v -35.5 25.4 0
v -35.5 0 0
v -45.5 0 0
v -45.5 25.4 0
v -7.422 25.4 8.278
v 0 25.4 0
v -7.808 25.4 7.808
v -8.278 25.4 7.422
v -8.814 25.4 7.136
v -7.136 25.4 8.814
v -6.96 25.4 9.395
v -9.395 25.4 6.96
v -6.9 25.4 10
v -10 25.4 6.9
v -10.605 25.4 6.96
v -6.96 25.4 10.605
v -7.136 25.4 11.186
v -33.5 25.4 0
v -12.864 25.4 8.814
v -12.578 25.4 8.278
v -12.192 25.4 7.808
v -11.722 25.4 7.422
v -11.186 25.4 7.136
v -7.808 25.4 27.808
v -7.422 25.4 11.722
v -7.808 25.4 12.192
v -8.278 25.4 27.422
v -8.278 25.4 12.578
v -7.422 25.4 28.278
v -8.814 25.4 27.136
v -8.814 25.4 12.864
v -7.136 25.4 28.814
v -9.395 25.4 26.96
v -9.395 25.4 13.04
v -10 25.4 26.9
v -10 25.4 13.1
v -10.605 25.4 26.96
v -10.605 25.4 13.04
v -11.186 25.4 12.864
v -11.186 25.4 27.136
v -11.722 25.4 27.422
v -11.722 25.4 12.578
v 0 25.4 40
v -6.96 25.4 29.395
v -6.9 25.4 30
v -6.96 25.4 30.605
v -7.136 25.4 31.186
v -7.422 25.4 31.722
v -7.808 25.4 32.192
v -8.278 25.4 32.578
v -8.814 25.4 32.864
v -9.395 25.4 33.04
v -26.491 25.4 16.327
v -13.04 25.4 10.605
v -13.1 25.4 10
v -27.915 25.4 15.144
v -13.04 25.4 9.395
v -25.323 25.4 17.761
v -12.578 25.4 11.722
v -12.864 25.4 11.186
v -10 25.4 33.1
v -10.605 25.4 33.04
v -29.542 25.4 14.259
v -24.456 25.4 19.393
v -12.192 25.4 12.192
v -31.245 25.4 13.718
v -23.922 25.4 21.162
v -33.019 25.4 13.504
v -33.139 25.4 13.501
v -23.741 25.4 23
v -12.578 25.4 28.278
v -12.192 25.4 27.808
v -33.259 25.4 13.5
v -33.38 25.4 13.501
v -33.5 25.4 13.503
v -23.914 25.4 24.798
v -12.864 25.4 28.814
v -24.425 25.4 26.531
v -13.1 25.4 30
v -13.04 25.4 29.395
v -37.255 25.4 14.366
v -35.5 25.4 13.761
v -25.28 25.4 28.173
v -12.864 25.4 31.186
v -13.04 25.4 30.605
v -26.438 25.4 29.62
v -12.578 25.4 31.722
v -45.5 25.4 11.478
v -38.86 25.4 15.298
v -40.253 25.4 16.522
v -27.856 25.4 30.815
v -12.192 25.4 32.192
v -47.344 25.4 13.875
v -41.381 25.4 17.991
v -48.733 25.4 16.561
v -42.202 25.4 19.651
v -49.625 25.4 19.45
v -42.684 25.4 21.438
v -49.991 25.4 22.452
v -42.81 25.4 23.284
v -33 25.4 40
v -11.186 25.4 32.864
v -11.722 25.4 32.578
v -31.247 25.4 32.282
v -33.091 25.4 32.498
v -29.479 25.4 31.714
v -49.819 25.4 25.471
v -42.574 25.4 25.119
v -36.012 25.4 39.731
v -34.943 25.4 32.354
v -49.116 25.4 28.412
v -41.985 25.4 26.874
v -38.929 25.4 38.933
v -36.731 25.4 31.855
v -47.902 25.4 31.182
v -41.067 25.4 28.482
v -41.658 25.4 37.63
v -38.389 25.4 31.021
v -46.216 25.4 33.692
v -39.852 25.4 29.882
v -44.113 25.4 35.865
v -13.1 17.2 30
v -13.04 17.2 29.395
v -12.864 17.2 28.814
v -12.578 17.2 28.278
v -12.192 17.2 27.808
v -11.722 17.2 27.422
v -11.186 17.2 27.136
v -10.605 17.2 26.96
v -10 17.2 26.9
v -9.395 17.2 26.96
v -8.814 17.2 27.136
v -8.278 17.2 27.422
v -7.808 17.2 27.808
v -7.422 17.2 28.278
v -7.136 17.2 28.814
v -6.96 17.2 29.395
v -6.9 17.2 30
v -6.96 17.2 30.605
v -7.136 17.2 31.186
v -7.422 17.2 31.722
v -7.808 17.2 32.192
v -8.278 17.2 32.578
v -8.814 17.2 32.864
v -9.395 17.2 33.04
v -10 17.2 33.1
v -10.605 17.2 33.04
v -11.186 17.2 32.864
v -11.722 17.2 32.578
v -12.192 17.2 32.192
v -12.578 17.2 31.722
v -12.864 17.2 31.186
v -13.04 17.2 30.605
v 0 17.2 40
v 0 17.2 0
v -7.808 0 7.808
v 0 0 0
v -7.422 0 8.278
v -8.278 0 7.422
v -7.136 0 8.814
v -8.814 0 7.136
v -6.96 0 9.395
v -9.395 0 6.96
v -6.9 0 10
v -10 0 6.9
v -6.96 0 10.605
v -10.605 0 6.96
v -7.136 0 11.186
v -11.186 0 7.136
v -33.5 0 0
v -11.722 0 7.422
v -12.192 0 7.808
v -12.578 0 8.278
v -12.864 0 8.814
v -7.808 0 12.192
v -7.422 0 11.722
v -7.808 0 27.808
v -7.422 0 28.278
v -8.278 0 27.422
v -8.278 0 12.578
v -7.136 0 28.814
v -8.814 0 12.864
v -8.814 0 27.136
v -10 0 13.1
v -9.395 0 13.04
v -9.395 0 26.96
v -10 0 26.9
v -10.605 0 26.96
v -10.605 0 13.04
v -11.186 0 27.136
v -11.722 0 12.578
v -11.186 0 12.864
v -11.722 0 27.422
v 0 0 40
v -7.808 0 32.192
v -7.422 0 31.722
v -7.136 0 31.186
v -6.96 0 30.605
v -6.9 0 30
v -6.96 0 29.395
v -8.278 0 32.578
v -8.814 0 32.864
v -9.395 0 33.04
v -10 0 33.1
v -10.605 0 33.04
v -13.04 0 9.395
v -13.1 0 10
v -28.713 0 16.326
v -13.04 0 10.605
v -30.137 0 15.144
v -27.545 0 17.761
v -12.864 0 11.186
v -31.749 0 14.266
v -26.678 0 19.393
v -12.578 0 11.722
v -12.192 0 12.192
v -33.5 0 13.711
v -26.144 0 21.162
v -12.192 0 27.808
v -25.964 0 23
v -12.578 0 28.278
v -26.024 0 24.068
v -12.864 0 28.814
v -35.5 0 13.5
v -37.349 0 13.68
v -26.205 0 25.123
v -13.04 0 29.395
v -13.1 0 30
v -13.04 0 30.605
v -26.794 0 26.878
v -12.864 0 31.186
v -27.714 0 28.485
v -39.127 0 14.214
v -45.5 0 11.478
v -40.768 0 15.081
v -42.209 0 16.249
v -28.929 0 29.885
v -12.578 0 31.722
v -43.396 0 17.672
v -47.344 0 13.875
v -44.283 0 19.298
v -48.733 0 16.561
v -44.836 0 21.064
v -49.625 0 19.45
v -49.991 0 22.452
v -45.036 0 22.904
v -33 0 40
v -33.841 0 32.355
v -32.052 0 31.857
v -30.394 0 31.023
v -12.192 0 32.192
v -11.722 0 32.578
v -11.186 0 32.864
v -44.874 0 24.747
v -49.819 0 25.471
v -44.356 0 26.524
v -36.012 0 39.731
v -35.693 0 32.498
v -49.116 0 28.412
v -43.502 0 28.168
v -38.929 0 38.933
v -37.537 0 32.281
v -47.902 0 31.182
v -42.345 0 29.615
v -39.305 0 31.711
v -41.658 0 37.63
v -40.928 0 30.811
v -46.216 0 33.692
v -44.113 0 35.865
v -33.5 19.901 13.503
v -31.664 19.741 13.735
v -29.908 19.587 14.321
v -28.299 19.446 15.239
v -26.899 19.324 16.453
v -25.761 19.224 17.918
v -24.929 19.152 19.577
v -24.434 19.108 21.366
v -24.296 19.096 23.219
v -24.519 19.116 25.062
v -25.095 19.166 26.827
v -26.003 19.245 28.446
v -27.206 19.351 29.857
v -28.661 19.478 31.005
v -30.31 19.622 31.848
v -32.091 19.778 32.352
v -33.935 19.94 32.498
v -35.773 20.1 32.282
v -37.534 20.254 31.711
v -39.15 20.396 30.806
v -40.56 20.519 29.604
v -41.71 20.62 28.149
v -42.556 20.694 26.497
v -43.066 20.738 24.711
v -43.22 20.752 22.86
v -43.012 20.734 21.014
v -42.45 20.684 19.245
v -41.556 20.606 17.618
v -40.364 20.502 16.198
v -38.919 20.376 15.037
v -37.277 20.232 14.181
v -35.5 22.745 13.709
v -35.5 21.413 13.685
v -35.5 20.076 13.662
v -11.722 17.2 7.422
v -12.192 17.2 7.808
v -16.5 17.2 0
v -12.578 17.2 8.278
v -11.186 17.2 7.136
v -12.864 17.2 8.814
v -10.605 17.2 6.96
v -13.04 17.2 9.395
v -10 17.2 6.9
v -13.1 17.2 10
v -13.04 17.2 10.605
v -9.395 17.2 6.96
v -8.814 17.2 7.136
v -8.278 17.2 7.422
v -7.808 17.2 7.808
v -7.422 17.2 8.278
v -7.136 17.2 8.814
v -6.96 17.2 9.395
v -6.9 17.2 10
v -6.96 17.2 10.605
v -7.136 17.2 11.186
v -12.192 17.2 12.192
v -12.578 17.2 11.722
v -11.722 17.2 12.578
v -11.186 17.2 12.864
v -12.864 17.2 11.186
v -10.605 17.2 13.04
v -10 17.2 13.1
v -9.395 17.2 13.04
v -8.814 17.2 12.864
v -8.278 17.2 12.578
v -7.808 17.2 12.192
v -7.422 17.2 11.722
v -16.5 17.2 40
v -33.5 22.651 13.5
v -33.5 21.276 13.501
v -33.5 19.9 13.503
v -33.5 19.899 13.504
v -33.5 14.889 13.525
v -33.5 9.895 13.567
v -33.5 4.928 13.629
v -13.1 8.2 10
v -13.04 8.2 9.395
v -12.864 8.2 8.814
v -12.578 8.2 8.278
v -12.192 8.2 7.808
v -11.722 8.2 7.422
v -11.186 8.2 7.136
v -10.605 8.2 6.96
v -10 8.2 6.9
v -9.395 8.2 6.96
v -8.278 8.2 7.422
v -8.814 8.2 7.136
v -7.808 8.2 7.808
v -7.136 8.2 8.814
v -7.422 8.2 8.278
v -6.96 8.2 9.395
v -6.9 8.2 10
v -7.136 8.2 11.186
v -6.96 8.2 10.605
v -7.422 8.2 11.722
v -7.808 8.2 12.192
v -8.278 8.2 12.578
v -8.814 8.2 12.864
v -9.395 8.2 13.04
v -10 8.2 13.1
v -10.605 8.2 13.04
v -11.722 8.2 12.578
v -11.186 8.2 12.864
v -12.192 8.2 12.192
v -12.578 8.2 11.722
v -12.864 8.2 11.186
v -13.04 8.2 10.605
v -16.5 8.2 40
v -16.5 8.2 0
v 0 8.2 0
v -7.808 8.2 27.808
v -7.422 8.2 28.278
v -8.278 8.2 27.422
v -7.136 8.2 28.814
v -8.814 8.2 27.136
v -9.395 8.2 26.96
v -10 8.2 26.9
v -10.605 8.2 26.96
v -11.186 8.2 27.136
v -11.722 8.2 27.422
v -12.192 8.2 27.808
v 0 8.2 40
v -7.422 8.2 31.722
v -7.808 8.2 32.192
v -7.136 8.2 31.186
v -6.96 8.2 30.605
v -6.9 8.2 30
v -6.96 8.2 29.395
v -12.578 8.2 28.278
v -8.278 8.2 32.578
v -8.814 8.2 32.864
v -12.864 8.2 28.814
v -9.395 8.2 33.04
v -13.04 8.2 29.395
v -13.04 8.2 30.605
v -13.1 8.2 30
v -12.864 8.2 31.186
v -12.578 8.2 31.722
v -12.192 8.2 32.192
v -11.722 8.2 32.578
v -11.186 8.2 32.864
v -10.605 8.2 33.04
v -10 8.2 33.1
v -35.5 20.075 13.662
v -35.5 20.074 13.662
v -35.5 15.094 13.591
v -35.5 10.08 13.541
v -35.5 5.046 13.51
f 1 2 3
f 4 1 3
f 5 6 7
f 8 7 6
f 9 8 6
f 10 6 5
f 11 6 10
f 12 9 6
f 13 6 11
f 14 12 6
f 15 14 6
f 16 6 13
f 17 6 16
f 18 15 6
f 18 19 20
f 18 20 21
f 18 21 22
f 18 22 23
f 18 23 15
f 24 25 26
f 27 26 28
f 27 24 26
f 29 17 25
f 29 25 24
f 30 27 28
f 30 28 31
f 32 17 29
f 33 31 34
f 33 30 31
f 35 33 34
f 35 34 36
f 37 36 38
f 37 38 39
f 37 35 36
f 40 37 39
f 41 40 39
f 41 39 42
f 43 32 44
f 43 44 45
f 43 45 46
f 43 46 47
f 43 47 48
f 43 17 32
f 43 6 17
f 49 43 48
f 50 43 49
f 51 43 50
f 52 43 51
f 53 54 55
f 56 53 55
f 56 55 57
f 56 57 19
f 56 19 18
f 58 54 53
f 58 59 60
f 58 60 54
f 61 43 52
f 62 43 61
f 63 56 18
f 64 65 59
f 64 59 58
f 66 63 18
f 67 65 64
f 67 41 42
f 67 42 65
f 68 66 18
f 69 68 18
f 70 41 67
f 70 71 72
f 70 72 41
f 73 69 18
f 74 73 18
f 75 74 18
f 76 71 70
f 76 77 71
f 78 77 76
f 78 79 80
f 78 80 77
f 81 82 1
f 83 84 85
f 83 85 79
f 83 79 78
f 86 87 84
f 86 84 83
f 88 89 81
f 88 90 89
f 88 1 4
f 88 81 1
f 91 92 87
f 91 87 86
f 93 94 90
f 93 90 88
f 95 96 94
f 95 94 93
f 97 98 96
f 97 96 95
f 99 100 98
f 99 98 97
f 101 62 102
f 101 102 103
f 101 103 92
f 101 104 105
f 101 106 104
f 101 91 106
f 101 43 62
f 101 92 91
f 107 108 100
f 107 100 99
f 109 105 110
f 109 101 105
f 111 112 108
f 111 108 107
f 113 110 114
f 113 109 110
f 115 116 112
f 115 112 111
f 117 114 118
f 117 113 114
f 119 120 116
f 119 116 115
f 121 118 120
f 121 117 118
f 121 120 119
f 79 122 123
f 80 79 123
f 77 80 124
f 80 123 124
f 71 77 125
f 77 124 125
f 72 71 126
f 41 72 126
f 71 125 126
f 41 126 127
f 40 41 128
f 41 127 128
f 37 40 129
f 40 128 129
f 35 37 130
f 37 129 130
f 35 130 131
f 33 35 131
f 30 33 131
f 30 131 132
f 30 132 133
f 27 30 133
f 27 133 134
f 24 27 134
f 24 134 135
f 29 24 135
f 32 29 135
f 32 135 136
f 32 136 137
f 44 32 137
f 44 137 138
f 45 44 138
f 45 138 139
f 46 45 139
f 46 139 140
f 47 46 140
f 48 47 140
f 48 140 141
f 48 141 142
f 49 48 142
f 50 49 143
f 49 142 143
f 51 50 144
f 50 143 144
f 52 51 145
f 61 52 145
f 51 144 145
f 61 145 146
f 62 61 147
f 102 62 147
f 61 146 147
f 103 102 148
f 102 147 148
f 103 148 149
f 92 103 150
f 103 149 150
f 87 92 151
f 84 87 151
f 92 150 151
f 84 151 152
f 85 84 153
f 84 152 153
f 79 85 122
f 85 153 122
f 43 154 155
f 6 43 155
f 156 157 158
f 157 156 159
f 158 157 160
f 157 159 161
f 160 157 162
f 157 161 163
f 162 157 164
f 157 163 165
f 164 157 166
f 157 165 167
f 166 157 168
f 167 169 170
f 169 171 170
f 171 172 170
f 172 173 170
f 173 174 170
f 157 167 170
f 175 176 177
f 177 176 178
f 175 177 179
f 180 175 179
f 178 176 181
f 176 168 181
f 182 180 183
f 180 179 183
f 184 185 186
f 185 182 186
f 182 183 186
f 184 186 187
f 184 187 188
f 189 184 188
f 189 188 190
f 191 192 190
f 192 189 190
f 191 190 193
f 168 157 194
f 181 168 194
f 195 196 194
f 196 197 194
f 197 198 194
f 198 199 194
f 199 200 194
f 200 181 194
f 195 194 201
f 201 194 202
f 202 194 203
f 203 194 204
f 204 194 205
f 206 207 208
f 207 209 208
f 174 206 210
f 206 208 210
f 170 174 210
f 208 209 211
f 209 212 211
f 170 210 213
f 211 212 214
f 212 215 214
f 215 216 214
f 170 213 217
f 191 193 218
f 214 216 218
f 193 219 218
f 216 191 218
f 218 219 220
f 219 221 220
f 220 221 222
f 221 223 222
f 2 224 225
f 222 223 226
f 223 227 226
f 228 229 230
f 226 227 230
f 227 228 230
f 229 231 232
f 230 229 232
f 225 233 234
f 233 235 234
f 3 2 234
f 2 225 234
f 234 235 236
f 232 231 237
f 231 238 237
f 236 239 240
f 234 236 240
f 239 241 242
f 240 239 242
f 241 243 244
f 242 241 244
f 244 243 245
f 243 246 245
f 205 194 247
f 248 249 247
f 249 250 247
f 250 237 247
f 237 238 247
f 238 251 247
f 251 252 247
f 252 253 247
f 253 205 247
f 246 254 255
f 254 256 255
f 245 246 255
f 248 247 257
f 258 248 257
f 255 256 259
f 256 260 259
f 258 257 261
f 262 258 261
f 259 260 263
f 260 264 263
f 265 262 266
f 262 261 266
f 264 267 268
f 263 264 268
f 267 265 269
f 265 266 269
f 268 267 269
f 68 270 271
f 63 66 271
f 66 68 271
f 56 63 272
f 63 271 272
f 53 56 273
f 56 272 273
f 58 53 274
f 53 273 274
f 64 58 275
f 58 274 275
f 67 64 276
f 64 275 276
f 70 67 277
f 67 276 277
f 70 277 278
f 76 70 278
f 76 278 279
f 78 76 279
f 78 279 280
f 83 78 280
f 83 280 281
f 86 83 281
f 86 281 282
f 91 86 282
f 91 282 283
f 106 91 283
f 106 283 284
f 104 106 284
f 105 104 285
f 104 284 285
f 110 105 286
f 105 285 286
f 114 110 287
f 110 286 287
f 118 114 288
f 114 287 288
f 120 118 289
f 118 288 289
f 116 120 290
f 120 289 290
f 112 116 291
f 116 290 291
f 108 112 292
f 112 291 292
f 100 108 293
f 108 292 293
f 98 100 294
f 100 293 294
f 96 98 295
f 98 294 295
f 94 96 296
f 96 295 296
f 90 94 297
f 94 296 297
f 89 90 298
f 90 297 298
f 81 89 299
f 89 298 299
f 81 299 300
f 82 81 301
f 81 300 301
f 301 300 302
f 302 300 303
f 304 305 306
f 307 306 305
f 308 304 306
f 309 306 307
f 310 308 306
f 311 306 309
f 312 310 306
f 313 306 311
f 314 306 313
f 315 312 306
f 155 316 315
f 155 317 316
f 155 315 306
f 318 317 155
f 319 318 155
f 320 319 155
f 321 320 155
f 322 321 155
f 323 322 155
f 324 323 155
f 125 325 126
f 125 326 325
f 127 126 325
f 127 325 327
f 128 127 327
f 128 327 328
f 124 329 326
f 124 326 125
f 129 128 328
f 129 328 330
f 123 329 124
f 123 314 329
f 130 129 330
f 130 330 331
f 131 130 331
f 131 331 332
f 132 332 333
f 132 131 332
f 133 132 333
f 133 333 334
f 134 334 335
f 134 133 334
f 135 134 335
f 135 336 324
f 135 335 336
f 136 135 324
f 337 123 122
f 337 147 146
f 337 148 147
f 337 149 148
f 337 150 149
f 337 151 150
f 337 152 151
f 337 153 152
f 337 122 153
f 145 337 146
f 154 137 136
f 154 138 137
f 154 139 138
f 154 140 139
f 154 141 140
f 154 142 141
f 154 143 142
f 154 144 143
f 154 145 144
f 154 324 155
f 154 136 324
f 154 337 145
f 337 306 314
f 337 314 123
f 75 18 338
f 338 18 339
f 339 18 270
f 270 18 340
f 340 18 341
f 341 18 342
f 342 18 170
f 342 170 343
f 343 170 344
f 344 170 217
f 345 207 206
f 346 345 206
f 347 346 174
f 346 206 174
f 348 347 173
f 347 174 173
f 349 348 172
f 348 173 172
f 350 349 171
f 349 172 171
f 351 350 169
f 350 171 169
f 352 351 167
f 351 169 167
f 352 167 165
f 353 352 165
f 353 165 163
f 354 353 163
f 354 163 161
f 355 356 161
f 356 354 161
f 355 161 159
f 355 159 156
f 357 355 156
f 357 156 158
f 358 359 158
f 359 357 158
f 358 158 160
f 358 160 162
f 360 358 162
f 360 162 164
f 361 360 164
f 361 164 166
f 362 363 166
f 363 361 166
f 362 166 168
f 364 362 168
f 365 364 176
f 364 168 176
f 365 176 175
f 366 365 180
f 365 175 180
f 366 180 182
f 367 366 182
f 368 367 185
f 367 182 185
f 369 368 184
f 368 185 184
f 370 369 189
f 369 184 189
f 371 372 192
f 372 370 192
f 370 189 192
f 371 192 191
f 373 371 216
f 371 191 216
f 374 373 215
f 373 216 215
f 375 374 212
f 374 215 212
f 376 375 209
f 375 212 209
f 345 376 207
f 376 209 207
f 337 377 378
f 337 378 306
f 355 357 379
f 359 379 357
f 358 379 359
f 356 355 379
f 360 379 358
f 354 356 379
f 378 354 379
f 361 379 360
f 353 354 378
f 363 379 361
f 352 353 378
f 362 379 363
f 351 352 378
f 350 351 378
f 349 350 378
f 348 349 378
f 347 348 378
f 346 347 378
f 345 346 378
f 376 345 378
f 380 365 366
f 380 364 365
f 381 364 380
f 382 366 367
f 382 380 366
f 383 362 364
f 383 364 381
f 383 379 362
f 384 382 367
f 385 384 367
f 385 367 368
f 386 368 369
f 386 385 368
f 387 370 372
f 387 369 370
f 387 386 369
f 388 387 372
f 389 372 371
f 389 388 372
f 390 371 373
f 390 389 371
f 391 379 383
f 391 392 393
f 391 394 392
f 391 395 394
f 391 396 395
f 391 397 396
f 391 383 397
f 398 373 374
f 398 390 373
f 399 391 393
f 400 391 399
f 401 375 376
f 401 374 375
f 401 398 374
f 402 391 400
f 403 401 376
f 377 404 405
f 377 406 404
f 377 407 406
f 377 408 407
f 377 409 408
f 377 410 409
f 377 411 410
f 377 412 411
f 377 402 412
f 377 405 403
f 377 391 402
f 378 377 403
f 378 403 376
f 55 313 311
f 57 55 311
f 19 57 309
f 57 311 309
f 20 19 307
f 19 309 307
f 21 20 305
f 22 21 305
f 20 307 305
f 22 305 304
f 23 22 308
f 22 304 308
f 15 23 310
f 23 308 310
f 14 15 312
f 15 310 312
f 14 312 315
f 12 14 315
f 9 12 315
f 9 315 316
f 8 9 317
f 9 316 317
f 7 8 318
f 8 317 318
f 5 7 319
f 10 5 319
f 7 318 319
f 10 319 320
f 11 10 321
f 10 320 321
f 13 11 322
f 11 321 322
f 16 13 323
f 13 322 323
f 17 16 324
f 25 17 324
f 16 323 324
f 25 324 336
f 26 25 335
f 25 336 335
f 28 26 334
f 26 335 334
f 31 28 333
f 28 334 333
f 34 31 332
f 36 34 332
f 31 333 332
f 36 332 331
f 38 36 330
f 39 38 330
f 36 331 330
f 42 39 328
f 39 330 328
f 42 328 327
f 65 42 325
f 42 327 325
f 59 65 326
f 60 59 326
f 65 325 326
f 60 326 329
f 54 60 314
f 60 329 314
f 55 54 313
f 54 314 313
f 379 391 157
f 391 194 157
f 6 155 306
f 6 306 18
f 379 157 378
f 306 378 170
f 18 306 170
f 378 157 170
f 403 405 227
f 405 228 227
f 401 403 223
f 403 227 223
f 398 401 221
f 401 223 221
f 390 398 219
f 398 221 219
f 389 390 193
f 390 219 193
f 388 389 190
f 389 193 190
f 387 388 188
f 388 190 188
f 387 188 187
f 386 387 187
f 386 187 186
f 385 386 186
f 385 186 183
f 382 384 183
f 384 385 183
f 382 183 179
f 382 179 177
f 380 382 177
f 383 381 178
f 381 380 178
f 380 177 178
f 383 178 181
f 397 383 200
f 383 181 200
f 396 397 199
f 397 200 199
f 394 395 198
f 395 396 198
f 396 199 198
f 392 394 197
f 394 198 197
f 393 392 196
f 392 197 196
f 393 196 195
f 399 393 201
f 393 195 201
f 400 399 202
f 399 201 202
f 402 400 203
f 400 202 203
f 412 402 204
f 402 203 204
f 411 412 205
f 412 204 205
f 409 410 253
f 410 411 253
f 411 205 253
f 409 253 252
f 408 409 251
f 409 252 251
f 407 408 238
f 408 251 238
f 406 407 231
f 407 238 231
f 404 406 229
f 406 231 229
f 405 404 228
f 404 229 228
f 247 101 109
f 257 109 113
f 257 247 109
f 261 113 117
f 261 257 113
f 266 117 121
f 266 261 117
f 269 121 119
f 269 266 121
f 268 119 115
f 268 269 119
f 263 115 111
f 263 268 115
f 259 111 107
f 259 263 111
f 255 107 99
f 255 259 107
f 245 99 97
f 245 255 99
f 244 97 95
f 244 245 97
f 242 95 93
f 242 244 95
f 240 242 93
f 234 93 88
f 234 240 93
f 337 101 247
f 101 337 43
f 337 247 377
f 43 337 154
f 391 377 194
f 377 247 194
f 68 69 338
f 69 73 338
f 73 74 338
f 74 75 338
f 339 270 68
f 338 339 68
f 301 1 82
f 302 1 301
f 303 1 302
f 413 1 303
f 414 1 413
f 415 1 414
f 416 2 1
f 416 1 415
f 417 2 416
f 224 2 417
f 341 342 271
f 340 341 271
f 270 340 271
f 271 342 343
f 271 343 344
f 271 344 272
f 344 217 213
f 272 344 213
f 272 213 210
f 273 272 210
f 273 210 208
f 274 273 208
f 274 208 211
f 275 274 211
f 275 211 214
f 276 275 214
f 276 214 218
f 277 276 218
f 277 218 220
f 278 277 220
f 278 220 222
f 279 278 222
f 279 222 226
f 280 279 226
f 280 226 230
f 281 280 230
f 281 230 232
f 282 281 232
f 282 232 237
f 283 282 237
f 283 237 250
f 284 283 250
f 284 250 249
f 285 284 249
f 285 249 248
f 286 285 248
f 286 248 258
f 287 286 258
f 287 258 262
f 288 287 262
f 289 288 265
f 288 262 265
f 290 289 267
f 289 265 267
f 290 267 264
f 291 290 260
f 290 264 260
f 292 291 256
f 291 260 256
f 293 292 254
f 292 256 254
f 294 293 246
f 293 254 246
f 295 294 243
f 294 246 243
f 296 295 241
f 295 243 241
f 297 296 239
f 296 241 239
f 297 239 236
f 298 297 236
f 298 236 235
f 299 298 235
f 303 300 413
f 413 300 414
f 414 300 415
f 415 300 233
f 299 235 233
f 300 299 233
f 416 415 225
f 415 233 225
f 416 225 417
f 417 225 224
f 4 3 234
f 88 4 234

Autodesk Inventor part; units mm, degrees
ref_plane "YZ Plane" through (0, 0, 0) normal (1, 0, 0) x (0, 1, 0)
ref_plane "XZ Plane" through (0, 0, 0) normal (0, 1, 0) x (-1, 0, 0)
ref_plane "XY Plane" through (0, 0, 0) normal (0, 0, 1) x (1, 0, 0)
sketch "Sketch1" plane through (0, 0, 0) normal (0, 1, 0) x (-1, 0, 0)
  line L0 (50, 0) -> (50, 40)
  line L1 (50, 40) -> (0, 40)
  line L2 (0, 40) -> (0, 0)
  line L3 (0, 0) -> (10, 0)
  line L4 (10, 0) -> (10, 10)
  line L5 (10, 10) -> (10, 30)
  circle A0 centre (10, 30) radius 3.1
  circle A1 centre (10, 10) radius 3.1
  line L6 (45.5, 0) -> (45.5, 11.4783)
  line L7 (0, 0) -> (33.5, 0)
  line L8 (35.5, 0) -> (35.5, 18.6699)
  line L9 (50, 40) -> (45.5, 40)
  line L10 (45.5, 40) -> (45.5, 35.5)
  line L11 (45.5, 35.5) -> (45.5, 34.5217)
  line L12 (45.5, 23) -> (33, 23)
  arc A2 (45.5, 11.4783) -> (33, 40) centre (33, 23) ccw
  line L13 (0, 0) -> (33.5, 0)
  line L14 (35.5, 0) -> (45.5, 0)
  line L15 (33.5, 0) -> (33.5, 18.0251)
  line L16 (0, 0) -> (33.5, 0)
  line L17 (35.5, 0) -> (45.5, 0)
  line L18 (33, 23) -> (28, 23)
  line L19 (33, 23) -> (38, 23)
  arc A3 (35.5, 18.6699) -> (38, 23) centre (33, 23) ccw
  arc A4 (28, 23) -> (33.5, 18.0251) centre (33, 23) ccw
  dimension "d0" = 50
  dimension "d1" = 40
  dimension "d2" = 10
  dimension "d3" = 10
  dimension "d4" = 20
  dimension "d5" = 6.2
  dimension "d6" = 6.2
  dimension "d7" = 45.5
  dimension "d8" = 35.5
  dimension "d9" = 4.5
  dimension "d10" = 4.5
  dimension "d13" = 12.5
  dimension "d14" = 12.5
  dimension "d15" = 2
extrude "Extrusion1" add sketch "Sketch1" along normal blind 25.4 contours A2 L6 L14 L8 A3 L12 L18 A4 L15 L7 L3 L2 L1
sketch "Sketch2" plane through (-33, 0, 40) normal (0, 0, 1) x (1, 0, 0)
  line L0 (33, 0) -> (33, 8.2)
  line L1 (33, 0) -> (33, 25.4) projected
  line L2 (33, 8.2) -> (16.5, 8.2)
  line L3 (16.5, 8.2) -> (16.5, 17.2)
  line L4 (16.5, 17.2) -> (33, 17.2)
  line L5 (33, 17.2) -> (33, 8.2)
  dimension "d18" = 8.2
  dimension "d19" = 16.5
  dimension "d20" = 9
extrude "Extrusion2" cut sketch "Sketch2" against normal through all
sketch "Sketch6" plane through (-28, 0, 23) normal (0, 0, -1) x (-1, 0, 0)
  line L0 (10, 25.4) -> (5.5, 25.4)
  line L1 (0, 25.4) -> (5.5, 25.4) projected
  line L2 (5.5, 25.4) -> (7.7222, 0)
  line L3 (7.5, 0) -> (17.5, 0) projected
  line L4 (5.5, 25.4) -> (30.997, 25.4) construction
  line L5 (7.5, 0) -> (8.3716, -9.9619)
  line L6 (7.5, 0) -> (17.5, 0) construction
  line L7 (15.2207, 20.7519) -> (-3.707, 19.0959)
  line L8 (-3.707, 19.0959) -> (-1.0923, -10.7899)
  line L9 (-1.0923, -10.7899) -> (8.3716, -9.9619)
  line L10 (8.3716, -9.9619) -> (5.7569, 19.9239)
  line L11 (8.3716, -9.9619) -> (38.3716, -9.9619) construction
  line L12 (8.3716, -9.9619) -> (5.7569, 19.9239)
  line L13 (-1.0923, -10.7899) -> (-3.707, 19.0959)
  line L14 (-1.0923, -10.7899) -> (28.9077, -10.7899) construction
  line L15 (-3.707, 19.0959) -> (5.7569, 19.9239)
  line L16 (5.7569, 19.9239) -> (8.3716, -9.9619)
  point P0 (-28, 0)
  dimension "d35" = 85
  dimension "d36" = 10
  dimension "d37" = 85
  dimension "d43" = 30
  dimension "d44" = 90
  dimension "d45" = 30
  dimension "d47" = 30
  dimension "d48" = 95
  dimension "d49" = 9.5
revolve "Revolution2" cut sketch "Sketch6" angle 360 about axis through (-36.3716, -9.9619, 23) along (0.0871557, 0.9961947, 0) contours L10 L5 L9 L8 L7
sketch "Sketch7" plane through (-35.5, 20.0764, 13.6625) normal (-0.0871557, -0.9961947, 0) x (0.9961947, -0.0871557, 0)
  arc A0 (2.0076, -0.159) -> (0, 0) centre (1.7498, 9.3375) ccw projected
  circle A1 centre (1.7498, 9.3375) radius 9.5
  point P0 (37.1147, -13.6625)
extrude "Extrusion3" cut sketch "Sketch7" against normal blind 10
properties part number "suporte-eixo"
